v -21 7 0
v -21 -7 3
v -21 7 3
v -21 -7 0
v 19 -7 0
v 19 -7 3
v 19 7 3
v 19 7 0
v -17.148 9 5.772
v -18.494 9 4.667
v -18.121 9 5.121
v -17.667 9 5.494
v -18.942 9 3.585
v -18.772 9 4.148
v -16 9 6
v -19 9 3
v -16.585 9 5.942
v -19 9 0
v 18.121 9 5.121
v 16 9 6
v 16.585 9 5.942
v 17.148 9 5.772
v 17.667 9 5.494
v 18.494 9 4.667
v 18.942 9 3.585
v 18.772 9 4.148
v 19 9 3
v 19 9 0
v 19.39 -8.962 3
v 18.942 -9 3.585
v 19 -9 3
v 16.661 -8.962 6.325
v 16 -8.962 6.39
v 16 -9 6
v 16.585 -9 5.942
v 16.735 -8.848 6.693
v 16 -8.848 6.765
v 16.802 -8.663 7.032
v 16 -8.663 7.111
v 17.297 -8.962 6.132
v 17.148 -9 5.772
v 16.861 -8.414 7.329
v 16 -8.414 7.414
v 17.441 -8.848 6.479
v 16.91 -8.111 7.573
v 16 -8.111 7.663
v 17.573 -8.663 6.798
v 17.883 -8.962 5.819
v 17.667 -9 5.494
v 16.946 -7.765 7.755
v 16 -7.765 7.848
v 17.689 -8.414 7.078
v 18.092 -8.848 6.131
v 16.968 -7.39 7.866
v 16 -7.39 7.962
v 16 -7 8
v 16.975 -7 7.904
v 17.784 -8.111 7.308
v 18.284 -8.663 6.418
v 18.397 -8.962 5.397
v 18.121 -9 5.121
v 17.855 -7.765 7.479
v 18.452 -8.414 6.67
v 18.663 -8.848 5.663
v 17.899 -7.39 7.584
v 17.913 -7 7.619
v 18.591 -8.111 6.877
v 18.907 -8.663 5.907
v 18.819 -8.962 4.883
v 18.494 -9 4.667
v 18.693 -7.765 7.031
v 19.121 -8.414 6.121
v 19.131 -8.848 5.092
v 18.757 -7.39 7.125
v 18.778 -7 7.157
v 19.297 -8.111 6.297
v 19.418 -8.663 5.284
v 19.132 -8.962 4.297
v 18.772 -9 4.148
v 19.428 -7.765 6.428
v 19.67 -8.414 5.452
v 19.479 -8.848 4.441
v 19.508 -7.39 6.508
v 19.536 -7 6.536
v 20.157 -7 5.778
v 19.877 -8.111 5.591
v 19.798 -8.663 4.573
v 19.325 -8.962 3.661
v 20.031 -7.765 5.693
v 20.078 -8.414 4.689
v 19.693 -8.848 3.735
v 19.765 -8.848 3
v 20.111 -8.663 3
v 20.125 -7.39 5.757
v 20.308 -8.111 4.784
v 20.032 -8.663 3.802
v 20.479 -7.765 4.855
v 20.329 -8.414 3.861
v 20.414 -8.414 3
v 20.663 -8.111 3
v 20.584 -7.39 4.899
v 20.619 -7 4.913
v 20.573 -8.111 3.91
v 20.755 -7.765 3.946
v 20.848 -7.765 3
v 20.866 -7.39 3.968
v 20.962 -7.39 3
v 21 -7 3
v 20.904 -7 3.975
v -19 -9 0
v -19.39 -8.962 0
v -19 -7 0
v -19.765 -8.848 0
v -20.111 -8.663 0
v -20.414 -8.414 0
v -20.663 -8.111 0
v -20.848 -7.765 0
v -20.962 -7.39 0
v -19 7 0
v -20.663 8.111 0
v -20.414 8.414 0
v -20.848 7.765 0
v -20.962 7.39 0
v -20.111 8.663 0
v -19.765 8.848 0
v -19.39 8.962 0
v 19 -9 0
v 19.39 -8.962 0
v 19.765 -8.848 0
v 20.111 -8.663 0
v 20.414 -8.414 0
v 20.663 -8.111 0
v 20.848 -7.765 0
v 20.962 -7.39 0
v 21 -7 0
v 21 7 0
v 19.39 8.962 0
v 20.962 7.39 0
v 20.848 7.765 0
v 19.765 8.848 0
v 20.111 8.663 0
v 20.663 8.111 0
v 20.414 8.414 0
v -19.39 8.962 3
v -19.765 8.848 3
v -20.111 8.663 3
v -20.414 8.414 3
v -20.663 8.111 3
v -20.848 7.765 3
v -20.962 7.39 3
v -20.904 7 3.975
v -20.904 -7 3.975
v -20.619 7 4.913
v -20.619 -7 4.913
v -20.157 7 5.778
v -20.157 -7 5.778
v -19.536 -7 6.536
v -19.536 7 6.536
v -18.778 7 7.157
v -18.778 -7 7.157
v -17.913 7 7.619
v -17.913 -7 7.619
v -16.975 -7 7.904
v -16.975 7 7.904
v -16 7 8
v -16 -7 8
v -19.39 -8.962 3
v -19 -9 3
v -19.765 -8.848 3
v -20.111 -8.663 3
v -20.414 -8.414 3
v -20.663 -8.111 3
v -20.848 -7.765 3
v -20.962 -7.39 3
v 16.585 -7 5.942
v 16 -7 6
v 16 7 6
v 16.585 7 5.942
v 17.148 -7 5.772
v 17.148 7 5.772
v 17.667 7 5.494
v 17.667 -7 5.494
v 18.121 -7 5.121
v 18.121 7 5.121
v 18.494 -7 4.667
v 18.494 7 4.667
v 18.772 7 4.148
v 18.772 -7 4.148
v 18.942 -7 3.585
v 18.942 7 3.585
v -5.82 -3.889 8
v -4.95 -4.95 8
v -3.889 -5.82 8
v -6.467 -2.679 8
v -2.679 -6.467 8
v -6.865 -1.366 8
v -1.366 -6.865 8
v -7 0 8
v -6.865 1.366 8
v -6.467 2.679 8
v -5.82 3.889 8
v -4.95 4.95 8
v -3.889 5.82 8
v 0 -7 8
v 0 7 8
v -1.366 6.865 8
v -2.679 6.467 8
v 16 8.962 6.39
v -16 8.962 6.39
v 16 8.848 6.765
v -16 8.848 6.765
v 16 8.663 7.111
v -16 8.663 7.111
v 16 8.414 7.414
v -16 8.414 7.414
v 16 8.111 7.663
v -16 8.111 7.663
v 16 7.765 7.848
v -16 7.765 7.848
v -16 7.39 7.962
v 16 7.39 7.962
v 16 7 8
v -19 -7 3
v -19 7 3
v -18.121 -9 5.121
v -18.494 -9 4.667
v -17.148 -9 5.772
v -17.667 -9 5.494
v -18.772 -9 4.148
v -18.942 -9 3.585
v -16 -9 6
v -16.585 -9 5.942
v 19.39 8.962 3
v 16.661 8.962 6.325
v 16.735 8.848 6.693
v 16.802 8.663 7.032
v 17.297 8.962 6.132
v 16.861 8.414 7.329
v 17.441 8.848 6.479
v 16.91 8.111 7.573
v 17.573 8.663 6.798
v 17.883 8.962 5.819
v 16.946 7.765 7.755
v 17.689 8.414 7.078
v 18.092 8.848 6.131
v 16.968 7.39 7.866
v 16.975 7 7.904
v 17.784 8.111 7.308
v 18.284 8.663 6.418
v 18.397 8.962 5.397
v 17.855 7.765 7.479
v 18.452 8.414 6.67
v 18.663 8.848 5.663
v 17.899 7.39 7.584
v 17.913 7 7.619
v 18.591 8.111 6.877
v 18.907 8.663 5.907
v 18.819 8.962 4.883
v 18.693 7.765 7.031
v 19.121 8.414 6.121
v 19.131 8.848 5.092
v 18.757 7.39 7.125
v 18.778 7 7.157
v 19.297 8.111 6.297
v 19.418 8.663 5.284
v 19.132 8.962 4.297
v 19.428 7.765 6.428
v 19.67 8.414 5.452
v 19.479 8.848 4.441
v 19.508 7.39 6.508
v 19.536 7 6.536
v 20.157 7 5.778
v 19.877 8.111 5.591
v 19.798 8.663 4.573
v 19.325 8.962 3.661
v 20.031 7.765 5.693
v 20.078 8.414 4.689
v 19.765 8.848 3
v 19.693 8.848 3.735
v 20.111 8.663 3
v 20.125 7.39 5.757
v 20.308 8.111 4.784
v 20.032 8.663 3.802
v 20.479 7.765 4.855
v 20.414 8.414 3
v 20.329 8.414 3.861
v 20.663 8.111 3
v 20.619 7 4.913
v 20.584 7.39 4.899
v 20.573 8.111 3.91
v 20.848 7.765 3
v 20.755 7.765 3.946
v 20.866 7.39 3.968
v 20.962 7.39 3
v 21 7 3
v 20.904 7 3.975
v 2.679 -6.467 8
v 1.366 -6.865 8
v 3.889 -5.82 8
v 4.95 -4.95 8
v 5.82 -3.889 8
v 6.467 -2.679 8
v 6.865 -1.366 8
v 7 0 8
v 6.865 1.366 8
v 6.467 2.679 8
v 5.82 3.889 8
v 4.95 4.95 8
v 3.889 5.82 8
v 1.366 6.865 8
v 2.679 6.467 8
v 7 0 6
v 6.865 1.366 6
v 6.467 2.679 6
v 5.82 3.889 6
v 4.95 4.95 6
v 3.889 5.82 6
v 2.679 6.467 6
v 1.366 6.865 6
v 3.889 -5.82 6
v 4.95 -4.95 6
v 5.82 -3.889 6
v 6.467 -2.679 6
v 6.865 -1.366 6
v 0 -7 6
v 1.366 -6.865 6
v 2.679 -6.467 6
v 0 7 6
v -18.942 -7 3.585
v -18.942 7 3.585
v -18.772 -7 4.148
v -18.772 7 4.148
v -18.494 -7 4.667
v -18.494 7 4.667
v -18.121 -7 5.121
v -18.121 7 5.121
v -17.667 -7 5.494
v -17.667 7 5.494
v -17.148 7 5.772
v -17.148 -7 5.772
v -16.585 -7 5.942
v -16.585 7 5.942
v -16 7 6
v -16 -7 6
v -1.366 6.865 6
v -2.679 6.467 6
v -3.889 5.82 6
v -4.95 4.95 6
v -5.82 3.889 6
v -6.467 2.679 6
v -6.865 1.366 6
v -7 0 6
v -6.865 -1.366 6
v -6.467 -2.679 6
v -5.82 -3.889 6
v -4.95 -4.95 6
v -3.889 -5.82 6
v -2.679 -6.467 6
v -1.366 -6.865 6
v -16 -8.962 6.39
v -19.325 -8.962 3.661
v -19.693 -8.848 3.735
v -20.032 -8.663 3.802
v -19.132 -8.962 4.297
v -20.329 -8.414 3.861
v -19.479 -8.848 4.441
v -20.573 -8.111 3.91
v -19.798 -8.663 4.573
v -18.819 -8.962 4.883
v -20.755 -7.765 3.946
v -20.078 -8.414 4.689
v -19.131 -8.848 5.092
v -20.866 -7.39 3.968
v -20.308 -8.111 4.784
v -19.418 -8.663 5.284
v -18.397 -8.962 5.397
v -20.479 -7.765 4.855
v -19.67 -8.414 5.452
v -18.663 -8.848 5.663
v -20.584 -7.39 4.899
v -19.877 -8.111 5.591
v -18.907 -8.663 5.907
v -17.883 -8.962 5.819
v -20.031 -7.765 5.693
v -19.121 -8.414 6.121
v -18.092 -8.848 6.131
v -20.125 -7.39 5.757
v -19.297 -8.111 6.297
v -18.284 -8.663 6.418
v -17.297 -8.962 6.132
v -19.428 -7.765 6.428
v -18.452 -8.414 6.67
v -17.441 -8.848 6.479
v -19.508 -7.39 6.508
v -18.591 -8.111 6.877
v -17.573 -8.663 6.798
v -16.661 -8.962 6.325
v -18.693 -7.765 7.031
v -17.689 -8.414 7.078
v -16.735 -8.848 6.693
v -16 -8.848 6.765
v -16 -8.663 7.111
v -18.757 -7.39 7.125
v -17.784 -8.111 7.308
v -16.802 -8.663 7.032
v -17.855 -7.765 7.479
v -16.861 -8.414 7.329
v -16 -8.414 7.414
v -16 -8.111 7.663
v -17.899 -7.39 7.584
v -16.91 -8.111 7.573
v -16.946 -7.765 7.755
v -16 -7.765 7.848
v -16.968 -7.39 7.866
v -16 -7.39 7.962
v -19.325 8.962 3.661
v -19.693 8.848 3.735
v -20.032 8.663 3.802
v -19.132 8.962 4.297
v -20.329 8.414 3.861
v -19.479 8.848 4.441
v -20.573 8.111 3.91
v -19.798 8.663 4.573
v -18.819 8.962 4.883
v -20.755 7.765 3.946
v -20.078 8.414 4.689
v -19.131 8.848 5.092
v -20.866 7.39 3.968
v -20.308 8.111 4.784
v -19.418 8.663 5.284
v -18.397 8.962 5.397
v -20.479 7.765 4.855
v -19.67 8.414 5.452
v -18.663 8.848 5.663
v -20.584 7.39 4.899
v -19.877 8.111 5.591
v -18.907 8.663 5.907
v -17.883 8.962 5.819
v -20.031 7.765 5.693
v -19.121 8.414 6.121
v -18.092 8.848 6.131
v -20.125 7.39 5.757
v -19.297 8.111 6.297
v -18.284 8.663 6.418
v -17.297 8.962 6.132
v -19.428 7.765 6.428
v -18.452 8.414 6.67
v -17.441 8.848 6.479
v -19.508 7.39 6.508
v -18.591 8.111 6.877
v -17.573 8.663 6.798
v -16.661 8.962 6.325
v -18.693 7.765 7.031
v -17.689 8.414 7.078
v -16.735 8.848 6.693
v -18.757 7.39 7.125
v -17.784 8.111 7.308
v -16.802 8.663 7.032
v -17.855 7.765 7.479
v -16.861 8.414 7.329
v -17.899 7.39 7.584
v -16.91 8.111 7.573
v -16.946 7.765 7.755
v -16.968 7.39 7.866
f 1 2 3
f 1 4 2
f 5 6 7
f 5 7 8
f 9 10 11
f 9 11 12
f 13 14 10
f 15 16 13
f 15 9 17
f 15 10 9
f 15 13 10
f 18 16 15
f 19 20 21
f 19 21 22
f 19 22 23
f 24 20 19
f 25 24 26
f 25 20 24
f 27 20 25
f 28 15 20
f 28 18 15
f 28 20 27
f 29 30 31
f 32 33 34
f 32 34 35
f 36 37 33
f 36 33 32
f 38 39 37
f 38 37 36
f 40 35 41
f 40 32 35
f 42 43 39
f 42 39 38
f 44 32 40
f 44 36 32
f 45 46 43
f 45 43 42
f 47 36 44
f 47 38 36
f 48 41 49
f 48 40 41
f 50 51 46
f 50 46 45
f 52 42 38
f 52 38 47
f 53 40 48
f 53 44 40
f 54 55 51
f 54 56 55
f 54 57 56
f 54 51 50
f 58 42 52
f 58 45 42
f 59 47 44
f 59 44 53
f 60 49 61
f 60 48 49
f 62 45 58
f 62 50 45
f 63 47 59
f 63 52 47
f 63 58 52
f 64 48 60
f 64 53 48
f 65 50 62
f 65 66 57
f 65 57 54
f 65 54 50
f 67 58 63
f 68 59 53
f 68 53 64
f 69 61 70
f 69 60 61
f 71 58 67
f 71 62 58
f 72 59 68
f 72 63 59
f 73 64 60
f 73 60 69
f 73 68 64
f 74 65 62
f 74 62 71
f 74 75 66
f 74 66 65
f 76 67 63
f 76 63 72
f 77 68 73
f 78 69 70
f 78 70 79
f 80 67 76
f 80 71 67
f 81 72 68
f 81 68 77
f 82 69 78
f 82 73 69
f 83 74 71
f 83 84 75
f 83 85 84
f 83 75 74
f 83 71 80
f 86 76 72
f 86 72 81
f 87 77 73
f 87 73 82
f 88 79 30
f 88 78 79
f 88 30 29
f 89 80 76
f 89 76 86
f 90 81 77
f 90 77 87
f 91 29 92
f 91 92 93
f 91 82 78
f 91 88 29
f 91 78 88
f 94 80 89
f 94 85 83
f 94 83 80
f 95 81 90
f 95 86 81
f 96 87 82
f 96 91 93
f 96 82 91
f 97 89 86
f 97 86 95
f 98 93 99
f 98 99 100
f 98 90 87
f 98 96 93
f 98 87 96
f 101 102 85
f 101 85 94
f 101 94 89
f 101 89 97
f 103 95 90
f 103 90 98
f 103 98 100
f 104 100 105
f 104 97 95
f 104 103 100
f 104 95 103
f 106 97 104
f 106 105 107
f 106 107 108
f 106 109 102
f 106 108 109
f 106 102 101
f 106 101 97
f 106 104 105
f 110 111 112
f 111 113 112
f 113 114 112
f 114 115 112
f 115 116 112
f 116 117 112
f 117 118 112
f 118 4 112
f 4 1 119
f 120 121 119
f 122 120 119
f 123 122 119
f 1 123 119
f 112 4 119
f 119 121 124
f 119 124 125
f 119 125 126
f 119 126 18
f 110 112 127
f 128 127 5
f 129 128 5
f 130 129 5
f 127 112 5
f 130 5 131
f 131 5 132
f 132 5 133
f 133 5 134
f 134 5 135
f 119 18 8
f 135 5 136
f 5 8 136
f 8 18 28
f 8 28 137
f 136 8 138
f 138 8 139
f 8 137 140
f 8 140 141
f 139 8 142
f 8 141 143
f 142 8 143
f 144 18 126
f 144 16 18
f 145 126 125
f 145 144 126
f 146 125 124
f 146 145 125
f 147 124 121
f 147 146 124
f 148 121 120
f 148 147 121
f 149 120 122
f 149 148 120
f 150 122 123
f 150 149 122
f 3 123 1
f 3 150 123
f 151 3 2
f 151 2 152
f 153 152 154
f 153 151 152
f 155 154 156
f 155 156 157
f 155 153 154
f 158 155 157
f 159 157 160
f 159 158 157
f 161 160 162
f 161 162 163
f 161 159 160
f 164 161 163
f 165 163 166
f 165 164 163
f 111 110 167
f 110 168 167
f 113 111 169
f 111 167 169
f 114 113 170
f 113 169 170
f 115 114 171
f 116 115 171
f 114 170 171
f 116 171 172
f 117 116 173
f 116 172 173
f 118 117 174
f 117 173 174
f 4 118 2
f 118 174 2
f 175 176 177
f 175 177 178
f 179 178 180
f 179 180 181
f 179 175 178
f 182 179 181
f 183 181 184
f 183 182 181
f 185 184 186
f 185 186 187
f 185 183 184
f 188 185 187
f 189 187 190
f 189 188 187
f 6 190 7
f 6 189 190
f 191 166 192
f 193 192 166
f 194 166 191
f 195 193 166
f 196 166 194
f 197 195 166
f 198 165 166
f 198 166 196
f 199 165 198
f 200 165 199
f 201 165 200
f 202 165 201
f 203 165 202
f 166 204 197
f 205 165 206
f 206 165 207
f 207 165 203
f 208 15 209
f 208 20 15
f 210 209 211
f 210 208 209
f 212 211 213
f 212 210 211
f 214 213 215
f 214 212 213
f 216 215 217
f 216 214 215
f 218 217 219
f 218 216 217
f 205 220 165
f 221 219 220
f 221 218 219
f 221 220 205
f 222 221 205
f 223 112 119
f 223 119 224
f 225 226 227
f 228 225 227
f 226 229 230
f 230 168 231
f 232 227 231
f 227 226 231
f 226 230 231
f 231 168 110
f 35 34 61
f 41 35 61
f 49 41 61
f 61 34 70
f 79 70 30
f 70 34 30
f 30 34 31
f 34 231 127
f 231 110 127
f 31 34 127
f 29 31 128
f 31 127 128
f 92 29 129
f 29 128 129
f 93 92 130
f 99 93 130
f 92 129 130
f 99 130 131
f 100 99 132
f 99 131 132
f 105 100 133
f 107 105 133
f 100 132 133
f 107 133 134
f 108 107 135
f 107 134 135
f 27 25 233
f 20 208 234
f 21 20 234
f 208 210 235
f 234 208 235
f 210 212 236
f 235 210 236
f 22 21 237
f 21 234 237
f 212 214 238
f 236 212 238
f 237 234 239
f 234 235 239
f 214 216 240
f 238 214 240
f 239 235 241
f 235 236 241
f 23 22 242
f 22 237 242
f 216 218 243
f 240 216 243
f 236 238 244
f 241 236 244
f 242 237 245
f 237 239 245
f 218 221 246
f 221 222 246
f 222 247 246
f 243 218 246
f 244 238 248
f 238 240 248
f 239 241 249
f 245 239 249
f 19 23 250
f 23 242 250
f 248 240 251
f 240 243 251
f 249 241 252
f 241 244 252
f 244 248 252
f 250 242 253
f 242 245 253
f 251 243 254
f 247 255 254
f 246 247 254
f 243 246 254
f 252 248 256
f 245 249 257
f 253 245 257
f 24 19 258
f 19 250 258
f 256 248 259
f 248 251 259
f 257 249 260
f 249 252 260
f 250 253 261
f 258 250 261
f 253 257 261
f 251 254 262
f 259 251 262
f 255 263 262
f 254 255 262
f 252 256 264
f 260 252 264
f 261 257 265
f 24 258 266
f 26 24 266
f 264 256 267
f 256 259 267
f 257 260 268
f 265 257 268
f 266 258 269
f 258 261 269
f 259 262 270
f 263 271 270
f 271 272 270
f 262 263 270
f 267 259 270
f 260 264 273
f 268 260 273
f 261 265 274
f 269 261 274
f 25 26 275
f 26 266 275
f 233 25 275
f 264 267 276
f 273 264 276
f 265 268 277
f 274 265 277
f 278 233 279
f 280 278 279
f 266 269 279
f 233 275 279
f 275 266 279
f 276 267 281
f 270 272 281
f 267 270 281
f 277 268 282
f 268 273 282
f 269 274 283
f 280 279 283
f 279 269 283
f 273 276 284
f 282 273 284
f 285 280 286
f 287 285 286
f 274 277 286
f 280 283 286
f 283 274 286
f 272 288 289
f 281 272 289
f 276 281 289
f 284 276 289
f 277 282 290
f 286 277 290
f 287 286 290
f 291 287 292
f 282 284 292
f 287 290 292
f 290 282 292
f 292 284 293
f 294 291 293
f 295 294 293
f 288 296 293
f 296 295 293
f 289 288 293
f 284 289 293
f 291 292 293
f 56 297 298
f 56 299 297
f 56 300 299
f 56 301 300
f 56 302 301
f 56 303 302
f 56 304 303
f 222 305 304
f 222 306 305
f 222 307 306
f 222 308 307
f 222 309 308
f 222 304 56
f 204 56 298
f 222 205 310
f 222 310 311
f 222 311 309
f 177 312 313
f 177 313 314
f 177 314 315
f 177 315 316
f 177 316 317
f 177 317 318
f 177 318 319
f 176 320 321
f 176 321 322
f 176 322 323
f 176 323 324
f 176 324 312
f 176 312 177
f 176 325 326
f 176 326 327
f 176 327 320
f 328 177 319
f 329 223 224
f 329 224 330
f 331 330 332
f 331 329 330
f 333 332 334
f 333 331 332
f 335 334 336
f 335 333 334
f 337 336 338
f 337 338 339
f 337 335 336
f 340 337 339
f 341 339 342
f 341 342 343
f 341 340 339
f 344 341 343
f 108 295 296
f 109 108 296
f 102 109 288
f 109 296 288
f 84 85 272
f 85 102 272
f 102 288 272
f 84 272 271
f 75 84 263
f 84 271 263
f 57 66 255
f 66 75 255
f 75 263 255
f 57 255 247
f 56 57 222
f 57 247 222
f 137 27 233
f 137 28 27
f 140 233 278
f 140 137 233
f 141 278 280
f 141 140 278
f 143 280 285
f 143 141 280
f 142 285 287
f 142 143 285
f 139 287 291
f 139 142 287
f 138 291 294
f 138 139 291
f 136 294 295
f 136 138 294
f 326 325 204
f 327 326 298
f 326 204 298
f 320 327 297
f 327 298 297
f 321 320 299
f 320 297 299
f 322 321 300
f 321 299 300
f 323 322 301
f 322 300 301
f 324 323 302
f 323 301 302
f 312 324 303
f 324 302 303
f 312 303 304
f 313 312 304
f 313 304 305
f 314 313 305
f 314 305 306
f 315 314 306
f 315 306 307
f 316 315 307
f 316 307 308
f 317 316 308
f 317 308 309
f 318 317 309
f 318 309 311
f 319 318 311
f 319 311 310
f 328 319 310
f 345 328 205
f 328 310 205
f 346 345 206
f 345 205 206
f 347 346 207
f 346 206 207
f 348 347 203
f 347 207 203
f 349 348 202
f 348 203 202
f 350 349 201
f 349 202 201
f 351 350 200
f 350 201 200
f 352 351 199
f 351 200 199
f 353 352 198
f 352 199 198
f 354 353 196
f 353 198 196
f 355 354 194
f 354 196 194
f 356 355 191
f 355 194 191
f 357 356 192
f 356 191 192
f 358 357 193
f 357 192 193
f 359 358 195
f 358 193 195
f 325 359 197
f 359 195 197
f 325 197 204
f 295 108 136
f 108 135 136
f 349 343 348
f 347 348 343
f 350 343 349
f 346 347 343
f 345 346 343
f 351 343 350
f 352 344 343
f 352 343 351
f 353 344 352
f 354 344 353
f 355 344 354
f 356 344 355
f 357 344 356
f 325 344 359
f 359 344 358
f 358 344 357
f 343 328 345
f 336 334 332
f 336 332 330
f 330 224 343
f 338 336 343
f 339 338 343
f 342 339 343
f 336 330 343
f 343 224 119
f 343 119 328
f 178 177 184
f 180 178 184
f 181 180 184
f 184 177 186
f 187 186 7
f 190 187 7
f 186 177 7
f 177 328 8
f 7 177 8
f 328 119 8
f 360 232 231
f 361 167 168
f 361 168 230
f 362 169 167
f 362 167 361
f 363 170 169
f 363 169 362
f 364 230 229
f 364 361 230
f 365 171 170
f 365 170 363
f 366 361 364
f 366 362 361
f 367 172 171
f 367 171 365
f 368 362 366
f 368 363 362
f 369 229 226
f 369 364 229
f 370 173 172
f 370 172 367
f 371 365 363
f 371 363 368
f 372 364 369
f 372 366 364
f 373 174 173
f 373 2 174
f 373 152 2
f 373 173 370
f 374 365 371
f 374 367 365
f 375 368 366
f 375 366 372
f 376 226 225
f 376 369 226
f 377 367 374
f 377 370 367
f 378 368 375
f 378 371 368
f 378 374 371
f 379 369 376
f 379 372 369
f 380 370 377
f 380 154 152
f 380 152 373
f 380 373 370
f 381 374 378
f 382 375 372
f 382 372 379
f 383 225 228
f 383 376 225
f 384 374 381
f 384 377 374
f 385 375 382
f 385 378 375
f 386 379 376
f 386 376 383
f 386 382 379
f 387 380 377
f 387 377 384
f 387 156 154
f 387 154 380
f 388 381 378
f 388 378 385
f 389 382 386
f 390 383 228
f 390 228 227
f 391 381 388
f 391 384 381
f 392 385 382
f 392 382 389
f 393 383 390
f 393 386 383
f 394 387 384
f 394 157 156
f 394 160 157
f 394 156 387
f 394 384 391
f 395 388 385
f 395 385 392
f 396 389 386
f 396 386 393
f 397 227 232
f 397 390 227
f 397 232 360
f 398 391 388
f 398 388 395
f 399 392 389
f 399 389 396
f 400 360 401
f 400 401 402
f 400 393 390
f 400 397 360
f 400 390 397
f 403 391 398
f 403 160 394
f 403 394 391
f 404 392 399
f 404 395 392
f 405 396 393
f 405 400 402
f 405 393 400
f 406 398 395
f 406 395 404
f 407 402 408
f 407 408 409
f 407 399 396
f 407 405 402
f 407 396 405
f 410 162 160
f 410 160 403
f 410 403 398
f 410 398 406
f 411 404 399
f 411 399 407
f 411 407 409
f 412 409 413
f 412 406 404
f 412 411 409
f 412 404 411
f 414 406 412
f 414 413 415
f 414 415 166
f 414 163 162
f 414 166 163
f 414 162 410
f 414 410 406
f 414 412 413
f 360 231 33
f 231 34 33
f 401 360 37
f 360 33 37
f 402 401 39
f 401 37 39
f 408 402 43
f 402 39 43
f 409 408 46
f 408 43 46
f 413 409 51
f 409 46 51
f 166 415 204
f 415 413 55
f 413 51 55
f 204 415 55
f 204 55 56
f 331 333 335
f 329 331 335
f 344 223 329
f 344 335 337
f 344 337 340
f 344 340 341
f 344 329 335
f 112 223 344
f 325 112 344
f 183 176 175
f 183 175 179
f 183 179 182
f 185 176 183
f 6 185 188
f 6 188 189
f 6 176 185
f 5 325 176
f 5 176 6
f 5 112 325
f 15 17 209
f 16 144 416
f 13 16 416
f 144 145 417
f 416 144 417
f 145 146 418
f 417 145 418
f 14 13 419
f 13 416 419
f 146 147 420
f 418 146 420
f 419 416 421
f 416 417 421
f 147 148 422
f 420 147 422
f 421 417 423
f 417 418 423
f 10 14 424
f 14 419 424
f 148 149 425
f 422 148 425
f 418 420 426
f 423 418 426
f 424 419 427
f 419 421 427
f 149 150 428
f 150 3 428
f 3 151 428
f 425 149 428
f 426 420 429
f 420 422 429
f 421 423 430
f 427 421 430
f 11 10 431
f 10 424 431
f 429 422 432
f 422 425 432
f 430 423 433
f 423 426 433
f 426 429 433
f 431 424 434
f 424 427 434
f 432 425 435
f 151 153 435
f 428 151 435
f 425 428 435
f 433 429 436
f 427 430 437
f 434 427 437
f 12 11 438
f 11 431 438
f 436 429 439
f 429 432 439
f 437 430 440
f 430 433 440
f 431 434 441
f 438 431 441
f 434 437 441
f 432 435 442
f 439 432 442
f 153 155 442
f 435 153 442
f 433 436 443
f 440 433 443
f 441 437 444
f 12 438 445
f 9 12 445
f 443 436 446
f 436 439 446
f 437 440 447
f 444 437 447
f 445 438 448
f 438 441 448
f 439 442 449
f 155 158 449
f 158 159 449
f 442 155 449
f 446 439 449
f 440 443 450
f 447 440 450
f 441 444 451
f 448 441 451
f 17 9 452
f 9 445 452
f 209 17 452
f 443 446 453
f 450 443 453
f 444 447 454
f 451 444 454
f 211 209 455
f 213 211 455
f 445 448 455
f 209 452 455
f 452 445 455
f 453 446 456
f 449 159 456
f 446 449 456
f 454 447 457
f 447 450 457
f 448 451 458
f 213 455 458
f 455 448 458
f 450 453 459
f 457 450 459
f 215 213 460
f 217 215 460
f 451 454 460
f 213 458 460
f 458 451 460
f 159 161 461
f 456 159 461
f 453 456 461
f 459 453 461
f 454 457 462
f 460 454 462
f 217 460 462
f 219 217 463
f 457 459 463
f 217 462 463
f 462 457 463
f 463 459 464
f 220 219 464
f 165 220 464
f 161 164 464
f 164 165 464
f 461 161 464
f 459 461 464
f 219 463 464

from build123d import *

# Parameters (mm, degrees)
SKETCH1_W           = 42
SKETCH1_H           = 18
BOSS_EXTRUDE1_DEPTH = 8
FILLET1_R           = 5
FILLET2_R           = 2
SHELL1_START        = -7
SHELL1_DEPTH        = 14
SKETCH2_R           = 7
CUT_EXTRUDE1_DEPTH  = 25.207436874


# Read off the part's stored shape, not the designer's step: Shell1
with BuildPart() as part:
    # Sketch1 → Boss-Extrude1 (new body)
    with BuildSketch(Plane.XY):
        Rectangle(SKETCH1_W, SKETCH1_H)
    extrude(amount=BOSS_EXTRUDE1_DEPTH)

    # Fillet1
    fillet1_edges = [part.edges().sort_by_distance(p)[0] for p in [
        (21, 0, 8),
        (-21, 0, 8),
    ]]
    fillet(fillet1_edges, radius=FILLET1_R)

    # Fillet2
    fillet2_edges = [part.edges().sort_by_distance(p)[0] for p in [
        (0, -9, 8),
        (0, 9, 8),
        (21, -9, 1.5),
        (-21, -9, 1.5),
        (19.535533906, -9, 6.535533906),
        (-19.535533906, -9, 6.535533906),
        (-21, 9, 1.5),
        (21, 9, 1.5),
        (19.535533906, 9, 6.535533906),
        (-19.535533906, 9, 6.535533906),
    ]]
    fillet(fillet2_edges, radius=FILLET2_R)

    # Shell1 outline → Shell1 (cut)
    with BuildSketch(Plane(origin=(0, 0, 0), x_dir=(1, 0, 0), z_dir=(0, 1, 0)).offset(SHELL1_START)):
        with BuildLine():
            Line((-19, 0), (-19, -3))
            ThreePointArc((-19, -3), (-18.121320344, -5.121320344), (-16, -6))
            Line((-16, -6), (16, -6))
            ThreePointArc((16, -6), (18.121320344, -5.121320344), (19, -3))
            Line((19, -3), (19, 0))
            Line((19, 0), (-19, 0))
        make_face()
    extrude(amount=SHELL1_DEPTH, mode=Mode.SUBTRACT)

    # Sketch2 → Cut-Extrude1 (cut, through all)
    with BuildSketch(Plane.XY.offset(8)):
        with Locations(Location((0, 0, 0), (0, 0, 270))):
            Circle(SKETCH2_R)
    extrude(amount=-CUT_EXTRUDE1_DEPTH, mode=Mode.SUBTRACT)


solid = part.part
